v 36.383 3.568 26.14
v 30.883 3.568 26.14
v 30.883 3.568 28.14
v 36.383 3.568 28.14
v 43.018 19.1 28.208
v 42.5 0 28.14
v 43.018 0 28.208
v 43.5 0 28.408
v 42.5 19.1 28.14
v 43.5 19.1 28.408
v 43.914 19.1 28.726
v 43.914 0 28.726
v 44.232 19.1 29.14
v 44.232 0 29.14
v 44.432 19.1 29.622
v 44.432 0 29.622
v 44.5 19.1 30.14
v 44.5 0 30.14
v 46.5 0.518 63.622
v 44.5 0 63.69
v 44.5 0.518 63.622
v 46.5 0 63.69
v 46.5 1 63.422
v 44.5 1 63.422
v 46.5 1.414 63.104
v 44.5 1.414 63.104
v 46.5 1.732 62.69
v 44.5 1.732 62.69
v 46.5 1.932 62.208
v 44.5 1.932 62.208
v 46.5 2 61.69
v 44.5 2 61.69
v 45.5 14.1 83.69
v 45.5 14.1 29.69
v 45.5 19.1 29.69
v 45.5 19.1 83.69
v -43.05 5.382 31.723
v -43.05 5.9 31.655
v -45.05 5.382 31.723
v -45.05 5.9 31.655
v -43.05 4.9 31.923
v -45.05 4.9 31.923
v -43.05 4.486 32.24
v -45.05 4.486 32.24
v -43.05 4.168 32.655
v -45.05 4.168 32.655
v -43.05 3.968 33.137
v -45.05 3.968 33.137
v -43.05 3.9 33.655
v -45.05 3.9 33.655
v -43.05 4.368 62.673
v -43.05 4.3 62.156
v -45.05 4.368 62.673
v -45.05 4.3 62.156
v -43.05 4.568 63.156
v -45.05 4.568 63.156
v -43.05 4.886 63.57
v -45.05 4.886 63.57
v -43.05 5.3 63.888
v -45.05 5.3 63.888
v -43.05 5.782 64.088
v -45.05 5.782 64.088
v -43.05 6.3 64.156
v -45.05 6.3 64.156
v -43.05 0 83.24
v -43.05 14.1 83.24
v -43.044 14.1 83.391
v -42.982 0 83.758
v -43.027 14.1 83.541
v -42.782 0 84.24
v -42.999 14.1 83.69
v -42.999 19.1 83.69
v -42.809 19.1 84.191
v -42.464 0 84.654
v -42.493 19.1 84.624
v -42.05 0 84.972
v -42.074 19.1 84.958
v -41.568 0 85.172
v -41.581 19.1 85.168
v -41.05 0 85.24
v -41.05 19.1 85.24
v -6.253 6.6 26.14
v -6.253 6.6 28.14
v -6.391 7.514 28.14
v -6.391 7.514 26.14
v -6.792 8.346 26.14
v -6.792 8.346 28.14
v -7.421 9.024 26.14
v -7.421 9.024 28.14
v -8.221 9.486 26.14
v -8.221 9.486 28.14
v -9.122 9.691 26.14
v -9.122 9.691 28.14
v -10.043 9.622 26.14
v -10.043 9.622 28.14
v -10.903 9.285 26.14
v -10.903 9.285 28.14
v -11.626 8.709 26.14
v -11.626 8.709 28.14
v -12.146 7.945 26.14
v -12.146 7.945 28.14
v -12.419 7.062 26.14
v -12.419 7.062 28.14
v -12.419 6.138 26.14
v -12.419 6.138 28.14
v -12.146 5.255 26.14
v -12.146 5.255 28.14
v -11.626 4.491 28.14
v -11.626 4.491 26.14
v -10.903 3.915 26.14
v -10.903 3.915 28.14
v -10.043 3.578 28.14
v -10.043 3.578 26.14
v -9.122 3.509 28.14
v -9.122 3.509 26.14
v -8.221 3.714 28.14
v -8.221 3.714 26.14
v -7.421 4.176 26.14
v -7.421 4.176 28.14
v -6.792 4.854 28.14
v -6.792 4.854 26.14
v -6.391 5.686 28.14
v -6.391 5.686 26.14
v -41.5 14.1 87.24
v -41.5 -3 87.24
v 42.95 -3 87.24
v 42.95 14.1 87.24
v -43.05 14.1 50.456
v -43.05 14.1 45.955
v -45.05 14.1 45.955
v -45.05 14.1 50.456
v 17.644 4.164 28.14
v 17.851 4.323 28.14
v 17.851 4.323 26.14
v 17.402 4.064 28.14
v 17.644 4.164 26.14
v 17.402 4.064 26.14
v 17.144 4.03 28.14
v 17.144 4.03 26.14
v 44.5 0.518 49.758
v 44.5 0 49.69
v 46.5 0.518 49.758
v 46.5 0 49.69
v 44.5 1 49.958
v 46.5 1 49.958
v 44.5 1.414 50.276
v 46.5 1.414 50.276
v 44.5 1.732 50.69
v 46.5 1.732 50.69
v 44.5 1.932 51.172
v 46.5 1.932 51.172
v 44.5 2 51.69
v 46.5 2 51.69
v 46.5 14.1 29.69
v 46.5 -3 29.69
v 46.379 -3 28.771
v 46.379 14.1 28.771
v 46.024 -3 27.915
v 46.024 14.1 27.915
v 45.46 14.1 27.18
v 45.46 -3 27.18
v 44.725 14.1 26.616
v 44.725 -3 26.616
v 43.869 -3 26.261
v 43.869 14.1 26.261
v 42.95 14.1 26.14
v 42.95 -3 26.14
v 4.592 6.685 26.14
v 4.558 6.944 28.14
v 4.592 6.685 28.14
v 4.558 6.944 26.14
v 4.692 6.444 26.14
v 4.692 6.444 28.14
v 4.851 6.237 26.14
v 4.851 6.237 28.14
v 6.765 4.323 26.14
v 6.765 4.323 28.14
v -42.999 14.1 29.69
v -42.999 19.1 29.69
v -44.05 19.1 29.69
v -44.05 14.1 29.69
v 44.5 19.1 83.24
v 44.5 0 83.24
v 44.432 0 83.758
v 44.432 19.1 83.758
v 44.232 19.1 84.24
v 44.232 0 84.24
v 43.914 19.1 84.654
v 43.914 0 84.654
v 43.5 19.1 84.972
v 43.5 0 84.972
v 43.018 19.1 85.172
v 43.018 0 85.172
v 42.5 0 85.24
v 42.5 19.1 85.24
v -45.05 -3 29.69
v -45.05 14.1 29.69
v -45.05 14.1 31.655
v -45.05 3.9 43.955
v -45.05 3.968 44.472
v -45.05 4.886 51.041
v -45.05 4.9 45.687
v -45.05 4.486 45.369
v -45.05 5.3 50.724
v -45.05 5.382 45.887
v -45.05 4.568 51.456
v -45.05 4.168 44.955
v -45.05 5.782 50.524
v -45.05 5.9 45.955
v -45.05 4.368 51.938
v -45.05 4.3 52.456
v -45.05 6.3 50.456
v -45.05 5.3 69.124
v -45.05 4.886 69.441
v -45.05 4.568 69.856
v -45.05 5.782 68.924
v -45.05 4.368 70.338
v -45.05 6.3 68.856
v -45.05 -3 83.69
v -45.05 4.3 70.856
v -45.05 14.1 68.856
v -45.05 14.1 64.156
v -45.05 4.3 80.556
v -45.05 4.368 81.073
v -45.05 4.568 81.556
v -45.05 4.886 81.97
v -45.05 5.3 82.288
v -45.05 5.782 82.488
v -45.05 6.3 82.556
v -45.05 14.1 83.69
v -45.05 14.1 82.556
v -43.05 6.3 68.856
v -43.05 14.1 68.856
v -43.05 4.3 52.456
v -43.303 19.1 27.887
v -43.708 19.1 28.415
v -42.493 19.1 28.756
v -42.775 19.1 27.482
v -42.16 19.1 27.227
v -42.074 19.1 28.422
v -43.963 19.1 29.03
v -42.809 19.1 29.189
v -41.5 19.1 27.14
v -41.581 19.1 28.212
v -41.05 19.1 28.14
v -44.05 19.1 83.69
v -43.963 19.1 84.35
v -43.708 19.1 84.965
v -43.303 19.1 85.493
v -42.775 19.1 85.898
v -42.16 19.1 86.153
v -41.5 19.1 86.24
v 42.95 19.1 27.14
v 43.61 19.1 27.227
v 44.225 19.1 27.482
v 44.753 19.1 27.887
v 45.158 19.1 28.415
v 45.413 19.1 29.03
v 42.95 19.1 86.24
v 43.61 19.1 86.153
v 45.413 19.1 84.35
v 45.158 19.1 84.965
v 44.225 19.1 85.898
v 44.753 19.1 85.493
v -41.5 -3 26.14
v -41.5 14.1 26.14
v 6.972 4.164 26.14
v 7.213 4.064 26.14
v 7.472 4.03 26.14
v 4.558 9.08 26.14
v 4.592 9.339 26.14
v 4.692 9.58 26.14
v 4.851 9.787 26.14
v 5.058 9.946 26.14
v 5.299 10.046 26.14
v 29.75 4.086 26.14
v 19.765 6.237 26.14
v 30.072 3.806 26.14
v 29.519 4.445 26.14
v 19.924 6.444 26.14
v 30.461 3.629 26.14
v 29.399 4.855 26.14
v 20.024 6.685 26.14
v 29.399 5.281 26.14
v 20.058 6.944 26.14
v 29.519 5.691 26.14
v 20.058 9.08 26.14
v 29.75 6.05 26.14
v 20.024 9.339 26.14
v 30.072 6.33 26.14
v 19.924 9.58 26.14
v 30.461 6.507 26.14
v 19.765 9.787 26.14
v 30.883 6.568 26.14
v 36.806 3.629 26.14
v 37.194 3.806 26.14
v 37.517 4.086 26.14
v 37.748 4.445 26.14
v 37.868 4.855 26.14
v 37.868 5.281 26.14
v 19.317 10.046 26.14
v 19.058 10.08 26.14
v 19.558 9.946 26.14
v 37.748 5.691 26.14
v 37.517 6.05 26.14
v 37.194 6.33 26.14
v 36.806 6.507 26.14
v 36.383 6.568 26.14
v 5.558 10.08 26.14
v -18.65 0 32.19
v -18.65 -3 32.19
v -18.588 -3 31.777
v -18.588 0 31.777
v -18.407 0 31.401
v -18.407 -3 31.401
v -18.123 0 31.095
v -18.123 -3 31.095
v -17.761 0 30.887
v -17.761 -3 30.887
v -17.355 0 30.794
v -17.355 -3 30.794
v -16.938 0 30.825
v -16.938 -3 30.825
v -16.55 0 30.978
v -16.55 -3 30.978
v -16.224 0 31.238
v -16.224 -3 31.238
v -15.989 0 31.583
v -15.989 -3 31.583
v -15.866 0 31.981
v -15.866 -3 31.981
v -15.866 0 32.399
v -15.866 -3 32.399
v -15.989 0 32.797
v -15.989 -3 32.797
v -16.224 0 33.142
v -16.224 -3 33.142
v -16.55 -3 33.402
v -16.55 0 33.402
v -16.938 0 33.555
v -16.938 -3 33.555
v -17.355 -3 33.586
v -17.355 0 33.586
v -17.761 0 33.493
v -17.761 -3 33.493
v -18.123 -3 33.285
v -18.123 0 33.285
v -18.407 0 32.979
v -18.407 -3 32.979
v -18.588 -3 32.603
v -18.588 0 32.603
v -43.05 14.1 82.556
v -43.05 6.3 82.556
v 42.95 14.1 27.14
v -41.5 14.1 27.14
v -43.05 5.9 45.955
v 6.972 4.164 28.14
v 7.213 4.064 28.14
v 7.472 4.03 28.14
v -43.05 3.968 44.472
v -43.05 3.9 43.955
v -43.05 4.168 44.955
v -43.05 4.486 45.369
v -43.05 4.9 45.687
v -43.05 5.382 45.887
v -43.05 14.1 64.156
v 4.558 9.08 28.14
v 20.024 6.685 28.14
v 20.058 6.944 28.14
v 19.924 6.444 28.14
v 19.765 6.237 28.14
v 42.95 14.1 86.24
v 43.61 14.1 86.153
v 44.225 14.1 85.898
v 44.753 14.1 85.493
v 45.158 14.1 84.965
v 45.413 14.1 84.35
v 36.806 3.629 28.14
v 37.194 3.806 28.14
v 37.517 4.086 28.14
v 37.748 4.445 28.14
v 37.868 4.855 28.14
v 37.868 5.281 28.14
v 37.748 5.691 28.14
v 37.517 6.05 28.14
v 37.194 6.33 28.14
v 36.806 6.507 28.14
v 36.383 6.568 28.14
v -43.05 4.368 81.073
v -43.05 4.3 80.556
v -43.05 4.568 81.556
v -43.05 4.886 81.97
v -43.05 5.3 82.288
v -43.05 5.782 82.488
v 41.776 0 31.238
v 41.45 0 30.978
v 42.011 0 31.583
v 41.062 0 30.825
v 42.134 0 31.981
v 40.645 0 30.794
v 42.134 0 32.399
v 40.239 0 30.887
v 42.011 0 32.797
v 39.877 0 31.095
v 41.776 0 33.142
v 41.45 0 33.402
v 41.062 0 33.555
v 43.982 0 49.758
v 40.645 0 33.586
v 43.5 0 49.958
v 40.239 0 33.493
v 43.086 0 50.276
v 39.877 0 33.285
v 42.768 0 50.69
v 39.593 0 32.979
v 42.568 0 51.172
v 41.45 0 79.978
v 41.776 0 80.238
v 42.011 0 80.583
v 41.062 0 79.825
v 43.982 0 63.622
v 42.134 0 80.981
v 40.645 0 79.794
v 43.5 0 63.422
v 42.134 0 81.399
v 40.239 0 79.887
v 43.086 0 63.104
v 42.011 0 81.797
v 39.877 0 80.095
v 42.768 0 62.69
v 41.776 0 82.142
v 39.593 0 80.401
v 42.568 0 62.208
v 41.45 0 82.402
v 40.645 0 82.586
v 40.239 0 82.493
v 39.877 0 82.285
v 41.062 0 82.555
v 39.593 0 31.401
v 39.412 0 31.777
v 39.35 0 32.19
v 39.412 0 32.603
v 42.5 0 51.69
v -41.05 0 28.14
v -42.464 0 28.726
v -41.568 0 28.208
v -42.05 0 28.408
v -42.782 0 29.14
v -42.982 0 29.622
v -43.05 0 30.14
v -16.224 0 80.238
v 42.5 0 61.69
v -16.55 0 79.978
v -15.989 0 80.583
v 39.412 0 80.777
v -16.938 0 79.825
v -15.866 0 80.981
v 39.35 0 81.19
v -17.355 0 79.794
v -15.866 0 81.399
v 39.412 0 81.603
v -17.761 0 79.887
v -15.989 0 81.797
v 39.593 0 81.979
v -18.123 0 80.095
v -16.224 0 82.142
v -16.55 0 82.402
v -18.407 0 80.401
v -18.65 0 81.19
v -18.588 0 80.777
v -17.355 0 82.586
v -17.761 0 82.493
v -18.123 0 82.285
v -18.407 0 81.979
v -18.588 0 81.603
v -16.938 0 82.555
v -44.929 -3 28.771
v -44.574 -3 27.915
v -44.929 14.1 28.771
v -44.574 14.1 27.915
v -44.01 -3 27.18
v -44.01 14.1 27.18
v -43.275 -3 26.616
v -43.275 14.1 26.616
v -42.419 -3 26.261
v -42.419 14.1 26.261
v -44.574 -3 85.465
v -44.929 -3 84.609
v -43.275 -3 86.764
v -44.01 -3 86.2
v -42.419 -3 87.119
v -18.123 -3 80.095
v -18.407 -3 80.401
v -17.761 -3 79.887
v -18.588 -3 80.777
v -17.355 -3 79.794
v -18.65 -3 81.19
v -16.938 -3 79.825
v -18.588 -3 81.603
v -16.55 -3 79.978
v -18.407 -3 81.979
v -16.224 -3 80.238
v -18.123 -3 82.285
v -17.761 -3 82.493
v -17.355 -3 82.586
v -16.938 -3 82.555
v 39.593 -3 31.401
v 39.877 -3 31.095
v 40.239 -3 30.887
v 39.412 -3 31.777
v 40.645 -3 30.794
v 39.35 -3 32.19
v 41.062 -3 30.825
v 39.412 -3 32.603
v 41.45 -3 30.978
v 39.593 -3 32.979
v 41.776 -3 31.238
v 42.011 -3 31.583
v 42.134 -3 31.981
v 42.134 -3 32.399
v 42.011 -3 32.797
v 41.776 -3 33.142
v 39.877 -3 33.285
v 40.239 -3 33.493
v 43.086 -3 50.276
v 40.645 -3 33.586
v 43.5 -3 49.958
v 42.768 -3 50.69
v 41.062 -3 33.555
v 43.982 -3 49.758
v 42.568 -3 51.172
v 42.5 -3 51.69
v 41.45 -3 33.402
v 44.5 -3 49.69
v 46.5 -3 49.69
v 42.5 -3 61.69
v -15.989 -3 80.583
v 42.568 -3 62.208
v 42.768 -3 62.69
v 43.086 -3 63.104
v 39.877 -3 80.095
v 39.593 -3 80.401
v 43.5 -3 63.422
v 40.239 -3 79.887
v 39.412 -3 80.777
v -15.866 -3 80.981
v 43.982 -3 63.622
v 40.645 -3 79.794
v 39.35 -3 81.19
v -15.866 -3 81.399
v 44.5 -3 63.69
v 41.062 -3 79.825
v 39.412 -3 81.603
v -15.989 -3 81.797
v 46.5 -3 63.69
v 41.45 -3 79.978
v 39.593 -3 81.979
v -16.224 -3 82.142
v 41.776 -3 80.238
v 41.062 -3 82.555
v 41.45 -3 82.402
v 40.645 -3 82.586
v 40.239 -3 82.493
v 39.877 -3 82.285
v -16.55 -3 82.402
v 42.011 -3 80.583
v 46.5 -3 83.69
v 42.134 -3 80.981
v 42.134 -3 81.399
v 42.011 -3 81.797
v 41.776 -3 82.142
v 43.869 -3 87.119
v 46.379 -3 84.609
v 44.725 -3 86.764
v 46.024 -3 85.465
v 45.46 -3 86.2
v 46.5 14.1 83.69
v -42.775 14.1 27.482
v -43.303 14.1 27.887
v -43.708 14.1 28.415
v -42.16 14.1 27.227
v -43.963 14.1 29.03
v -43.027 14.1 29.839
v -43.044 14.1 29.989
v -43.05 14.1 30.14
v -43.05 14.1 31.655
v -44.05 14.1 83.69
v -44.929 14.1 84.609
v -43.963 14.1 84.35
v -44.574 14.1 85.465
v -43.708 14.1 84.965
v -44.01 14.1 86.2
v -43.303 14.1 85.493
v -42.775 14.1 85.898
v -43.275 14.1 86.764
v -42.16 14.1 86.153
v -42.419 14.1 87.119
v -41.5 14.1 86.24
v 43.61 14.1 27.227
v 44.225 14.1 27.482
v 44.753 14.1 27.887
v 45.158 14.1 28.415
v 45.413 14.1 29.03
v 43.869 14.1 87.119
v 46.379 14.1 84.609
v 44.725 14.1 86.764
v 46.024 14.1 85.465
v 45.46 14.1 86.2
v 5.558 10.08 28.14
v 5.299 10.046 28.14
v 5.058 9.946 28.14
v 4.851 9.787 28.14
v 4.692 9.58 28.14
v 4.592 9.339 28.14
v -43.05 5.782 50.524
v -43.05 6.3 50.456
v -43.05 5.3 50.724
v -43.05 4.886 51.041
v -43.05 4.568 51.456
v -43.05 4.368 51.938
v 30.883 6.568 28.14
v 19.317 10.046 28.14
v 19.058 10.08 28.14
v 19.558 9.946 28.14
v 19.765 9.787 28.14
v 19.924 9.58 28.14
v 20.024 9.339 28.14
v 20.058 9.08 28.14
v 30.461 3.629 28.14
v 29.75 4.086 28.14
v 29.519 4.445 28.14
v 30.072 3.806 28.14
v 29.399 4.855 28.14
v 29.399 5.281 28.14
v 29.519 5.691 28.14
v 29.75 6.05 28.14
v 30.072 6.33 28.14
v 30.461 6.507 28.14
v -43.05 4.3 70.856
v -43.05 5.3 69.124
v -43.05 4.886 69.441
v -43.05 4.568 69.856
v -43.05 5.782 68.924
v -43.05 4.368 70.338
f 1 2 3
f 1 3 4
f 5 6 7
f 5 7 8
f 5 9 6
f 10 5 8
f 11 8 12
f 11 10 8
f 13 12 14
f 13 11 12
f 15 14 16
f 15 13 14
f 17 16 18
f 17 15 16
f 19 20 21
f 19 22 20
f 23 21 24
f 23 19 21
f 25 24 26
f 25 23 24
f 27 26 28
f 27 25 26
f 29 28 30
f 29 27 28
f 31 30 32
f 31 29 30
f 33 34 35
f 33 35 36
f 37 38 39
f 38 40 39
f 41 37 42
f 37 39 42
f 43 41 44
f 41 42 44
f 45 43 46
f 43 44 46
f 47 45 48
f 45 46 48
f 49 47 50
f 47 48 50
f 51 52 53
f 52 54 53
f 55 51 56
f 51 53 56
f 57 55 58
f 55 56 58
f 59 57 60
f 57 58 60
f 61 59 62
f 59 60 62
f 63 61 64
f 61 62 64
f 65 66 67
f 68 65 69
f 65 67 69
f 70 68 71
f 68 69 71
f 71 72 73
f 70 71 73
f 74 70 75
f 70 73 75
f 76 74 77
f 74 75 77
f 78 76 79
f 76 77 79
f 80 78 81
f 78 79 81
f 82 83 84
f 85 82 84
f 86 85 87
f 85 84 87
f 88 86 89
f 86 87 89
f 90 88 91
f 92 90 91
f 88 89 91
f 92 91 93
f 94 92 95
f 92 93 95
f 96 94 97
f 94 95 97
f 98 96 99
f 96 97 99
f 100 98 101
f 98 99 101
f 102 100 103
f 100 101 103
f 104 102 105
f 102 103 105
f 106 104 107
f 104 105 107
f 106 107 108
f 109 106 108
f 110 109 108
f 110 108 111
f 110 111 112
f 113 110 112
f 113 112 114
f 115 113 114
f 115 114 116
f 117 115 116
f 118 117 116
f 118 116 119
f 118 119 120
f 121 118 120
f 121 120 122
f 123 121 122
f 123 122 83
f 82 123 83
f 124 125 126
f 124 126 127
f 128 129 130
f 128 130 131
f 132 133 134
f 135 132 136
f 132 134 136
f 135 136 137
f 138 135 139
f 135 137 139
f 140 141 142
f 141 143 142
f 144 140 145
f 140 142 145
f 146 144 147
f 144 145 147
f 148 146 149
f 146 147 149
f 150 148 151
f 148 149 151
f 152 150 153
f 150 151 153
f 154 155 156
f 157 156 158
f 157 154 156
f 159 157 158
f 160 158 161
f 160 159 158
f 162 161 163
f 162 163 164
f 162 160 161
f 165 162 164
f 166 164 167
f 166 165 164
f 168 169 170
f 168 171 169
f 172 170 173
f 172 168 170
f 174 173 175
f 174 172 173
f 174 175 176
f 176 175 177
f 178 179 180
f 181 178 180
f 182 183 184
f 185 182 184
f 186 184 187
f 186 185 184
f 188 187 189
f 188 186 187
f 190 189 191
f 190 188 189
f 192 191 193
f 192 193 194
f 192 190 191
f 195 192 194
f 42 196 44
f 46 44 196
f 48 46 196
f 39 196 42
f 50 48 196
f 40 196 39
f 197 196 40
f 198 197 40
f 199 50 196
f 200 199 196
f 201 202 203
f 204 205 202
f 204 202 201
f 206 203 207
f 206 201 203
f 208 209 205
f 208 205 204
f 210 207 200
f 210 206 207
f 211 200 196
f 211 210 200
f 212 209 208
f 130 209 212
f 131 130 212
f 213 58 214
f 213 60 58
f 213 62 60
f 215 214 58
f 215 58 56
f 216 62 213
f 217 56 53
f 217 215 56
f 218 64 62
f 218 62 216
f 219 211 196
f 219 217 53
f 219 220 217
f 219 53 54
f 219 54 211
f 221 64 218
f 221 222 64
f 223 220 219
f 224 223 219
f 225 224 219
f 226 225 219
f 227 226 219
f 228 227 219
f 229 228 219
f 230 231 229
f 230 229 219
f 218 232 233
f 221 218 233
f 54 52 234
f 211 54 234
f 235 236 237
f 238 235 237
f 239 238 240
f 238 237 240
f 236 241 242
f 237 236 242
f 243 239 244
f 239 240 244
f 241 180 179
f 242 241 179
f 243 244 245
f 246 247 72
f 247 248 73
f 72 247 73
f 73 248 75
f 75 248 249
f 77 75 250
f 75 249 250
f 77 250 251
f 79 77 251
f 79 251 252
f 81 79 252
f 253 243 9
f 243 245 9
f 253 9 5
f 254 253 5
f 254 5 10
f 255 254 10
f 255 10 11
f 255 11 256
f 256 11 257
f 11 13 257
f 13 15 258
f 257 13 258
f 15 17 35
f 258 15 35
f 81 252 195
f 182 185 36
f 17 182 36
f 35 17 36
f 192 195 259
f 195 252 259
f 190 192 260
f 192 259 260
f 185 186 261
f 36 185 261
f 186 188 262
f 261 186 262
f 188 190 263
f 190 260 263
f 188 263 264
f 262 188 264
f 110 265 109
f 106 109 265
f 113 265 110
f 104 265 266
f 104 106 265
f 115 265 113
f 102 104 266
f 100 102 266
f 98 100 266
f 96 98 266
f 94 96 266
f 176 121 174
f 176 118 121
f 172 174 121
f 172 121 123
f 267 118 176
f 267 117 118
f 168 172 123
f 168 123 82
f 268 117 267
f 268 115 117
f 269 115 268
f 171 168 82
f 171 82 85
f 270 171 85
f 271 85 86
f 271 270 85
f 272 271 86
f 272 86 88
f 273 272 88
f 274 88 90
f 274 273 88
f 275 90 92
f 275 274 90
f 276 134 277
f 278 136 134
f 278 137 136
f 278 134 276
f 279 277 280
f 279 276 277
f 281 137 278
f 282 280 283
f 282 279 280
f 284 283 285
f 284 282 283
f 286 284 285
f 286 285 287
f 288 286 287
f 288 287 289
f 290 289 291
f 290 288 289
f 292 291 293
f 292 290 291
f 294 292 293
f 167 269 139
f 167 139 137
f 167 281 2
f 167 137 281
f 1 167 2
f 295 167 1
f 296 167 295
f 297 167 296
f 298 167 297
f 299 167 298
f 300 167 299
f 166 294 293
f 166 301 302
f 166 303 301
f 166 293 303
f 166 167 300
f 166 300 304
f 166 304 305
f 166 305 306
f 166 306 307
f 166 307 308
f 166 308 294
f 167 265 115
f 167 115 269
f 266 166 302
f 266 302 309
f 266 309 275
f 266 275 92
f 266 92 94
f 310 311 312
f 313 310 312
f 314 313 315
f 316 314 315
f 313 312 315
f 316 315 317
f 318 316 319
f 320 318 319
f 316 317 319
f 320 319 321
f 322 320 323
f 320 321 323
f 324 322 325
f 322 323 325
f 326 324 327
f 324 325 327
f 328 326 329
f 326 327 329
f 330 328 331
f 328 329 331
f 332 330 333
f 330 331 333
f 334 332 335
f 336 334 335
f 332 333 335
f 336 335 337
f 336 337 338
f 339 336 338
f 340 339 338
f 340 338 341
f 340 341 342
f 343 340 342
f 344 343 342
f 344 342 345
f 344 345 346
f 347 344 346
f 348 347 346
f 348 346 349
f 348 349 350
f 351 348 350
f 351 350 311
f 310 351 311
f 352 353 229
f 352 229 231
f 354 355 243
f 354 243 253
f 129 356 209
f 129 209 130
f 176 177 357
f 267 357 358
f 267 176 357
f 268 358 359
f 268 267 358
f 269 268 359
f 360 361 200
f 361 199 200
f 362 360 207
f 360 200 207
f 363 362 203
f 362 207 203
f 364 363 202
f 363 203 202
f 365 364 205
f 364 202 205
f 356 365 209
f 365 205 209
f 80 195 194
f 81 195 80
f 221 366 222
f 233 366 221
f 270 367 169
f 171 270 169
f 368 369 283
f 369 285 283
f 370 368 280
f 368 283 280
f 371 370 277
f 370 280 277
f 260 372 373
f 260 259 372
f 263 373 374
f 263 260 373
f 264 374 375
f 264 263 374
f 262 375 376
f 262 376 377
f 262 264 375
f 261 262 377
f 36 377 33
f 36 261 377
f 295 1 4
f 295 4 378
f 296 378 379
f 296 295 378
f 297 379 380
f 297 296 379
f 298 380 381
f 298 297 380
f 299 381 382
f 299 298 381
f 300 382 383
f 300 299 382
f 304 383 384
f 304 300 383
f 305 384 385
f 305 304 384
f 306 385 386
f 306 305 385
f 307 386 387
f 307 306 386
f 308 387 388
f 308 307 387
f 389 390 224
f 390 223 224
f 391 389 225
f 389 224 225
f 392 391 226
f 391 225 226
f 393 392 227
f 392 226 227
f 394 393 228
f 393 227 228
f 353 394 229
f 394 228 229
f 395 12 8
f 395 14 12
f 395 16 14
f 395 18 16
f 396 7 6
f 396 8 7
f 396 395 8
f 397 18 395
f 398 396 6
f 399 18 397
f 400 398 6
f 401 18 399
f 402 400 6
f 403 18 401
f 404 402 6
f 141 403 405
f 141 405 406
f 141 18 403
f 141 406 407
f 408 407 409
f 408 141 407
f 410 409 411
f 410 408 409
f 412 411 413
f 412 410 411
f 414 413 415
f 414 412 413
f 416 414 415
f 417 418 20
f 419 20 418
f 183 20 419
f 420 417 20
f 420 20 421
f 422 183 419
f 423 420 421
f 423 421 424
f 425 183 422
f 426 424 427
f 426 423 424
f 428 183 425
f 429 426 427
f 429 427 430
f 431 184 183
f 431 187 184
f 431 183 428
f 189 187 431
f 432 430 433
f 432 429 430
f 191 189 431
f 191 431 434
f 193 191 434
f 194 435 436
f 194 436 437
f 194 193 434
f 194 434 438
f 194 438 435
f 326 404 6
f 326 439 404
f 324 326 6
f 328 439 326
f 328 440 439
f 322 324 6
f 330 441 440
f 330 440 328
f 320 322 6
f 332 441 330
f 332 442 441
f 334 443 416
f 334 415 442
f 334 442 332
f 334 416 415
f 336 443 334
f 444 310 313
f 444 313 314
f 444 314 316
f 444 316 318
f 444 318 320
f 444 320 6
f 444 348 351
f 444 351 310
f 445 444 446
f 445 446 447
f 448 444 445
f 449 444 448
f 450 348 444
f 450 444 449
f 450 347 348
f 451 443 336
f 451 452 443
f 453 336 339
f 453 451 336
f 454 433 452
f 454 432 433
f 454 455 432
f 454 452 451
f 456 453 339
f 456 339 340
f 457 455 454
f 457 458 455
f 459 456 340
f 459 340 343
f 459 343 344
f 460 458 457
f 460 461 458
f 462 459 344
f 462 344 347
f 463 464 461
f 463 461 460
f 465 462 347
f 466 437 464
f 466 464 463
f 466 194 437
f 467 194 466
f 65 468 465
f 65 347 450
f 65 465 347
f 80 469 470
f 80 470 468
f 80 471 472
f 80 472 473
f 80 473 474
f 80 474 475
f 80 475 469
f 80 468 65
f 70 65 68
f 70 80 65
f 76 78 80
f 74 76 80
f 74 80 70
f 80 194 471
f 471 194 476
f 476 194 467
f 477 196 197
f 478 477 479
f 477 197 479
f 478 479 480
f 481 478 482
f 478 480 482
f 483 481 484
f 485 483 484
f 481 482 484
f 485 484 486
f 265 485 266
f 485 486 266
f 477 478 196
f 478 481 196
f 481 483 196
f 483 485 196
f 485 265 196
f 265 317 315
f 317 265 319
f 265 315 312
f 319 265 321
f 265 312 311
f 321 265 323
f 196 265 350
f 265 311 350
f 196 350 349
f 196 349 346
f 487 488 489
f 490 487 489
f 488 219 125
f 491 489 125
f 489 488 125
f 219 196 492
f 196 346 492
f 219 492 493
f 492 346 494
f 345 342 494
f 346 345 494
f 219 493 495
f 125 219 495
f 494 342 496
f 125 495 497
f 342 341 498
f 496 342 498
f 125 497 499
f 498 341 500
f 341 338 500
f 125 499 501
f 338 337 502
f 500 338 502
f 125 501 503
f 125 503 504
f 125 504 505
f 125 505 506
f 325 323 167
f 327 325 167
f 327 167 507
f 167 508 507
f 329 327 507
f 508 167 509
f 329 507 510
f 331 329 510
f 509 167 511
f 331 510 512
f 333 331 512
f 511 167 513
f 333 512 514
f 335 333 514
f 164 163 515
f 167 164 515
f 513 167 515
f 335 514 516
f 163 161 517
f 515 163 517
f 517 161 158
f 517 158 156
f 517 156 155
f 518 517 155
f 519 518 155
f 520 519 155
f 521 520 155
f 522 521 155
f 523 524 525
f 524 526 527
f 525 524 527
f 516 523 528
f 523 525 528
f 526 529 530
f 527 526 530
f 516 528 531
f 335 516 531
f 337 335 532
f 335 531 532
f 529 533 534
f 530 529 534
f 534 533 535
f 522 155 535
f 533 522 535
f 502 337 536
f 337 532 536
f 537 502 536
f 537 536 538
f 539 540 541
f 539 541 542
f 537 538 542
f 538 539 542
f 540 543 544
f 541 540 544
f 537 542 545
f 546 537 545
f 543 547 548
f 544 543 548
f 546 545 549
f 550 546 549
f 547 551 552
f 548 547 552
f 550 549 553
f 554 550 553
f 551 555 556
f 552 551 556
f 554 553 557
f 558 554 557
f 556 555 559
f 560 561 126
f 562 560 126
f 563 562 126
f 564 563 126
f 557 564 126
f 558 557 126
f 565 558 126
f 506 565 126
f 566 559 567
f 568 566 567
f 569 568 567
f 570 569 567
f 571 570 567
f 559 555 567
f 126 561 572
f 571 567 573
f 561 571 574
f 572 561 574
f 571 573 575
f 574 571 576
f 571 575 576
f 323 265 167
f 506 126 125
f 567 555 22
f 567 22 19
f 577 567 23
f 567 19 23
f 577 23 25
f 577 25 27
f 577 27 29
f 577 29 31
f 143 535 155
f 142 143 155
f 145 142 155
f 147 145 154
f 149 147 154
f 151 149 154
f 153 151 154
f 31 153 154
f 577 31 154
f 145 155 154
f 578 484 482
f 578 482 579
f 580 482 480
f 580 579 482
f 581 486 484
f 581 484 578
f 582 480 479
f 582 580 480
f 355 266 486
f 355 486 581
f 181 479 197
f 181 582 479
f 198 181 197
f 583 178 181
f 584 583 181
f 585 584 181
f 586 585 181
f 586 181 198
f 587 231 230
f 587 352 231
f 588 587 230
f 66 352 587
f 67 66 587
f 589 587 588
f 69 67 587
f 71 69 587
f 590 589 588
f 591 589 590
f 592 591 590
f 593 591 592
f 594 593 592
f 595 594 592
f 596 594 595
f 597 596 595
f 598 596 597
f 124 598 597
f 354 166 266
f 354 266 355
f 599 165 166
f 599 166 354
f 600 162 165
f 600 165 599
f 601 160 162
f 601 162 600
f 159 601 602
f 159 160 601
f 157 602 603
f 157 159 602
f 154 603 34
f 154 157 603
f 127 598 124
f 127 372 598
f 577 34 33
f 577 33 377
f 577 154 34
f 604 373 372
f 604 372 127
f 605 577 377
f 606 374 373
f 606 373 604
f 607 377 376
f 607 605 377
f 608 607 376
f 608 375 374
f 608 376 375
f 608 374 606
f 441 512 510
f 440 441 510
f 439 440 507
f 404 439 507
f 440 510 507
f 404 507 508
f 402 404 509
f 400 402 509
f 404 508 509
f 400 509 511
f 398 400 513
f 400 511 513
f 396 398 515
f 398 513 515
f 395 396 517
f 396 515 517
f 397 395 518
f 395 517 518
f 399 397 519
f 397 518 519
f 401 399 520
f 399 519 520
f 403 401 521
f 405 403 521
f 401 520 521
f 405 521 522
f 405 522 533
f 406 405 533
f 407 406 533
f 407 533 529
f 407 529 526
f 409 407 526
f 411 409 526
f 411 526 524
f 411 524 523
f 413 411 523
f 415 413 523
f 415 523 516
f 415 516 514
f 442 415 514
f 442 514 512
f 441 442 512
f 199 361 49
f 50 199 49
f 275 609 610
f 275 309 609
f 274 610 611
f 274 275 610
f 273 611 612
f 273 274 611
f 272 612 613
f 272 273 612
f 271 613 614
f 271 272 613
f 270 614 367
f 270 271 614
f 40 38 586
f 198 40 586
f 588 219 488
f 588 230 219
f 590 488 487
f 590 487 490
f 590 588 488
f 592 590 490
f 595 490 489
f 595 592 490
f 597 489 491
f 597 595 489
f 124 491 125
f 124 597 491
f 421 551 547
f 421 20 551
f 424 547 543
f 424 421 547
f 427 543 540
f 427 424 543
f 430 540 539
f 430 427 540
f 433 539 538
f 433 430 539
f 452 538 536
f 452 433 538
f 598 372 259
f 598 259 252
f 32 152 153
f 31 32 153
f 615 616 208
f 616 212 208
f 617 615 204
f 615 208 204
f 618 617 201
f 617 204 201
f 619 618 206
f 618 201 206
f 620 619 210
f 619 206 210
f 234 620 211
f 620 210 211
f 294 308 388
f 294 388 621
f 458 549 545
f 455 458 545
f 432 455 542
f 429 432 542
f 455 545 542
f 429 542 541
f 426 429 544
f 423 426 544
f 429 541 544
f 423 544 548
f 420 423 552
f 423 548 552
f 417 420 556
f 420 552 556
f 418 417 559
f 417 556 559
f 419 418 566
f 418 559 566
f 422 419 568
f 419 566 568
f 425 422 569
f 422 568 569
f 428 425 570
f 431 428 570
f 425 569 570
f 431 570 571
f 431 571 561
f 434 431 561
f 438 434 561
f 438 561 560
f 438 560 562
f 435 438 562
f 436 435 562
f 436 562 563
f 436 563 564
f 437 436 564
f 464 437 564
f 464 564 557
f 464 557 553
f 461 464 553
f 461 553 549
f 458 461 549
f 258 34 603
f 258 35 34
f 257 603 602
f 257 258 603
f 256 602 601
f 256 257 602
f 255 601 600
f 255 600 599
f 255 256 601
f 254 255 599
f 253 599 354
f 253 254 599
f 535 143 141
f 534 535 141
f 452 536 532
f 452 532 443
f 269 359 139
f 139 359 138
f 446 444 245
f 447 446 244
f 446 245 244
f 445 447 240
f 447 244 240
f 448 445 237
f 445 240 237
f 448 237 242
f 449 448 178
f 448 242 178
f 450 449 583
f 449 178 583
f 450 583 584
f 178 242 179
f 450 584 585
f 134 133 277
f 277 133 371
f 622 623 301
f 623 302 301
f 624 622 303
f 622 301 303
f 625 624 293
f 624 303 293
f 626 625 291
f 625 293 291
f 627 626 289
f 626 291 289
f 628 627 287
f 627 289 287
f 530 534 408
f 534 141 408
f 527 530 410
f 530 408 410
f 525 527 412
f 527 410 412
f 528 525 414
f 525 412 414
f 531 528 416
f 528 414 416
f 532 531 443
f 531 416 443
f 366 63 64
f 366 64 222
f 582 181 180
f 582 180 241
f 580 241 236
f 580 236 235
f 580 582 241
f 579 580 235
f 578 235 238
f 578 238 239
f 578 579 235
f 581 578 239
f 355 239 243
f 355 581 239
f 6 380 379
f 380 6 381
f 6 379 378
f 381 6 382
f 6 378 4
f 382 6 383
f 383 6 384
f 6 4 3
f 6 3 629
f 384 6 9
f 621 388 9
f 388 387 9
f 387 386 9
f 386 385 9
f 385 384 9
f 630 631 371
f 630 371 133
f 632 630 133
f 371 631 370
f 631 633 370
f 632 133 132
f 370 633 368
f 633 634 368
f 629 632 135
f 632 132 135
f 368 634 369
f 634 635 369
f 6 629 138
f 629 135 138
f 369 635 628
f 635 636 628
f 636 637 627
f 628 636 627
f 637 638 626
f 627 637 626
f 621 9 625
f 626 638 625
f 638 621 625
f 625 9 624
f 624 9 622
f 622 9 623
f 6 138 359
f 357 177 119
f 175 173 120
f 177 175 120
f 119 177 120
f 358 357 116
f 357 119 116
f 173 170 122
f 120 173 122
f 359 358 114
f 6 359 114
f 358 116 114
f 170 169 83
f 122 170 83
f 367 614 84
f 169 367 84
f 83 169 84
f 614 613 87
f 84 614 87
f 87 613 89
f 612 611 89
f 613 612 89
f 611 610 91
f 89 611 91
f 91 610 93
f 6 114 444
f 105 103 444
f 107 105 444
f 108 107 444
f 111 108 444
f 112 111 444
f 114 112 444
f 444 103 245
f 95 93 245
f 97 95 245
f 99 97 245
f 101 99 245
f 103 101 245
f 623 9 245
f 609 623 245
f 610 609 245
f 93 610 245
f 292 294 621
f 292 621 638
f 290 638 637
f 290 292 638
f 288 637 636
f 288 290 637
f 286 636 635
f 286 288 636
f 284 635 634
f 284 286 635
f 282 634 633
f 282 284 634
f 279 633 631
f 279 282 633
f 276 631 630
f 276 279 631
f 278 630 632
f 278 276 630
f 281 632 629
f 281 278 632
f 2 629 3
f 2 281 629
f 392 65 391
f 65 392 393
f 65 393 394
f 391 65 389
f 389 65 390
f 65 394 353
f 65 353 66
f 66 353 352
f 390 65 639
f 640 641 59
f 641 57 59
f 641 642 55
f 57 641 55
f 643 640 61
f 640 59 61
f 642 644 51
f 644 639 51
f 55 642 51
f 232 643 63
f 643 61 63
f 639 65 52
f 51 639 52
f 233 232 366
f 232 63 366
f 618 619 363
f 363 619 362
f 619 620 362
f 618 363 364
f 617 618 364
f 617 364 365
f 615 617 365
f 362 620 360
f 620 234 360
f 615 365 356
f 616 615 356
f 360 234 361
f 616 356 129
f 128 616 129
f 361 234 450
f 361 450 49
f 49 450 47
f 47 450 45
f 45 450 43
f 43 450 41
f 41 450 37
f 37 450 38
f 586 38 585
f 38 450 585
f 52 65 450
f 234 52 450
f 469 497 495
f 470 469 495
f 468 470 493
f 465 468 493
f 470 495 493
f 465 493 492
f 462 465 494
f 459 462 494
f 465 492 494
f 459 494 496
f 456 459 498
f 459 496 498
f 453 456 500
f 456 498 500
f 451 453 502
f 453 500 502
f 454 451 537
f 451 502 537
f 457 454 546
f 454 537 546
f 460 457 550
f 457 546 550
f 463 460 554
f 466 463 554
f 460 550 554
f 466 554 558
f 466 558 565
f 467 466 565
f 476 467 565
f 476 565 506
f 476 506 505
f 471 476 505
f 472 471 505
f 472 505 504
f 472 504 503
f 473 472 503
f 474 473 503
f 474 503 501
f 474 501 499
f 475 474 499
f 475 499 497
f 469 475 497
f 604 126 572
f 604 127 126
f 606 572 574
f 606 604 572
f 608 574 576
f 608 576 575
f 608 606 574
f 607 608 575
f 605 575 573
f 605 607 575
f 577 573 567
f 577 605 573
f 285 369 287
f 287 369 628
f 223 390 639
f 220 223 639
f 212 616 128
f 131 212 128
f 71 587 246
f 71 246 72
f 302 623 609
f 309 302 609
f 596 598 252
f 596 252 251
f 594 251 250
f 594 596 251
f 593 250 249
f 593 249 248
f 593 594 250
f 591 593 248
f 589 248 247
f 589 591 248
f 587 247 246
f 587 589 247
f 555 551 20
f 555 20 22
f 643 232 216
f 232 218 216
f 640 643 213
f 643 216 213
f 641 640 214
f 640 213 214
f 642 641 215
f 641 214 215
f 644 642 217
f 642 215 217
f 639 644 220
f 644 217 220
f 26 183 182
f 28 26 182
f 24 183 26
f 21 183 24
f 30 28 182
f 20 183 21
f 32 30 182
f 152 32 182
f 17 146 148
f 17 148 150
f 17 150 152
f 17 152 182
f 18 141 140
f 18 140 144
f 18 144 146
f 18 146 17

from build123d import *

# Parameters (mm, degrees)
SKETCH1_W                      = 86.55
SKETCH1_H                      = 17.1
BOSS_EXTRUDE1_DEPTH            = 14
SKETCH2_W                      = 88.55
SKETCH2_H                      = 17.1
BOSS_EXTRUDE2_DEPTH            = 23.55
SKETCH3_W                      = 37.55
SKETCH3_H                      = 17.1
BOSS_EXTRUDE3_DEPTH            = 2
SKETCH4_W                      = 90.55
SKETCH4_H                      = 17.1
BOSS_EXTRUDE4_DEPTH            = 23.55
SKETCH5_W                      = 2
SKETCH5_H                      = 14
CUT_EXTRUDE1_DEPTH             = 3
CUT_EXTRUDE2_DEPTH             = 14.1
SKETCH7_W                      = 2
SKETCH7_H                      = 14
CUT_EXTRUDE3_DEPTH             = 2
BOSS_EXTRUDE5_DEPTH            = 5
SKETCH9_W                      = 87.55
SKETCH9_H                      = 19.1
CUT_EXTRUDE4_DEPTH             = 1.55
SKETCH10_W                     = 61.1
SKETCH10_H                     = 17.1
BOSS_EXTRUDE6_DEPTH            = 1
CUT_EXTRUDE5_REACH             = 79.588
SKETCH11_W                     = 87.55
SKETCH11_H                     = 19.1
SKETCH12_W                     = 13.7
SKETCH12_H                     = 9.8
CUT_EXTRUDE6_DEPTH             = 127.470668932
SKETCH13_W                     = 13.7
SKETCH13_H                     = 9.8
CUT_EXTRUDE7_DEPTH             = 127.470668932
SKETCH14_W                     = 14.3
SKETCH14_H                     = 10.2
CUT_EXTRUDE8_DEPTH             = 127.470668932
CUT_EXTRUDE10_DEPTH            = 78.587821209
CUT_EXTRUDE11_REACH            = 81.122
F_2_8_2_8_DIAMETER_HOLE1_D     = 2.8
F_6_2_6_2_DIAMETER_HOLE1_D     = 6.2
F_6_2_6_2_DIAMETER_HOLE1_DEPTH = 2
FILLET1_R                      = 1
FILLET2_R                      = 2
FILLET3_R                      = 2.55
FILLET4_R                      = 3.55


with BuildPart() as part:
    # Sketch1 → Boss-Extrude1 (new body)
    with BuildSketch(Plane.XY.offset(63.69)):
        with Locations((-0.775, 5.55)):
            Rectangle(SKETCH1_W, SKETCH1_H)
    extrude(amount=-BOSS_EXTRUDE1_DEPTH)

    # Sketch2 → Boss-Extrude2 (add)
    with BuildSketch(Plane(origin=(0, 0, 49.69), x_dir=(-1, 0, 0), z_dir=(0, 0, -1))):
        with Locations((-0.225, 5.55)):
            Rectangle(SKETCH2_W, SKETCH2_H)
    extrude(amount=BOSS_EXTRUDE2_DEPTH)

    # Sketch3 → Boss-Extrude3 (add)
    with BuildSketch(Plane(origin=(44.5, 0, 0), x_dir=(0, 0, -1), z_dir=(1, 0, 0))):
        with Locations((-44.915, 5.55)):
            Rectangle(SKETCH3_W, SKETCH3_H)
    extrude(amount=BOSS_EXTRUDE3_DEPTH)

    # Sketch4 → Boss-Extrude4 (add)
    with BuildSketch(Plane.XY.offset(63.69)):
        with Locations((1.225, 5.55)):
            Rectangle(SKETCH4_W, SKETCH4_H)
    extrude(amount=BOSS_EXTRUDE4_DEPTH)

    # Sketch5 → Cut-Extrude1 (cut)
    with BuildSketch(Plane.XZ.offset(3)):
        with Locations((45.5, 56.69)):
            Rectangle(SKETCH5_W, SKETCH5_H)
    extrude(amount=-CUT_EXTRUDE1_DEPTH, mode=Mode.SUBTRACT)

    # Sketch6 → Cut-Extrude2 (cut)
    with BuildSketch(Plane(origin=(0, 14.1, 0), x_dir=(-1, 0, 0), z_dir=(0, 1, 0))):
        Polygon((43.05, 29.69), (43.05, 83.69), (-44.5, 83.69), (-44.5, 63.69), (-42.5, 63.69), (-42.5, 49.69), (-44.5, 49.69), (-44.5, 29.69), align=None)
    extrude(amount=-CUT_EXTRUDE2_DEPTH, mode=Mode.SUBTRACT)

    # Sketch7 → Cut-Extrude3 (cut)
    with BuildSketch(Plane.XZ):
        with Locations((45.5, 56.69)):
            Rectangle(SKETCH7_W, SKETCH7_H)
    extrude(amount=-CUT_EXTRUDE3_DEPTH, mode=Mode.SUBTRACT)

    # Sketch8 → Boss-Extrude5 (add)
    with BuildSketch(Plane(origin=(0, 14.1, 0), x_dir=(-1, 0, 0), z_dir=(0, 1, 0))):
        with BuildLine():
            Line((-44.5, 83.69), (-44.5, 29.69))
            Line((-44.5, 29.69), (44.05, 29.69))
            ThreePointArc((44.05, 29.69), (43.303122292, 27.886877708), (41.5, 27.14))
            Line((41.5, 27.14), (-45.5, 27.14))
            Line((-45.5, 27.14), (-45.5, 86.24))
            Line((-45.5, 86.24), (41.5, 86.24))
            ThreePointArc((41.5, 86.24), (43.303122292, 85.493122292), (44.05, 83.69))
            Line((44.05, 83.69), (-44.5, 83.69))
        make_face()
    extrude(amount=BOSS_EXTRUDE5_DEPTH)

    # Sketch9 → Cut-Extrude4 (cut)
    with BuildSketch(Plane(origin=(0, 0, 83.69), x_dir=(-1, 0, 0), z_dir=(0, 0, -1))):
        with Locations((-0.725, 9.55)):
            Rectangle(SKETCH9_W, SKETCH9_H)
    extrude(amount=-CUT_EXTRUDE4_DEPTH, mode=Mode.SUBTRACT)

    # Sketch10 → Boss-Extrude6 (add)
    with BuildSketch(Plane.ZY.offset(44.05)):
        with Locations((56.69, 5.55)):
            Rectangle(SKETCH10_W, SKETCH10_H)
    extrude(amount=BOSS_EXTRUDE6_DEPTH)

    # Sketch11 → Cut-Extrude5 (cut, up to next)
    with BuildSketch(Plane(origin=(0, 0, 28.14), x_dir=(-1, 0, 0), z_dir=(0, 0, -1)), mode=Mode.PRIVATE) as cut_extrude5_sk1:
        with Locations((-0.725, 9.55)):
            Rectangle(SKETCH11_W, SKETCH11_H)
    cut_extrude5_tool1 = extrude(cut_extrude5_sk1.sketch, amount=-CUT_EXTRUDE5_REACH, mode=Mode.PRIVATE) & part.part
    add(cut_extrude5_tool1.solids().sort_by_distance((0.725, 9.55, 28.14))[0], mode=Mode.SUBTRACT)

    # Sketch12 → Cut-Extrude6 (cut, through all)
    with BuildSketch(Plane(origin=(-43.05, 0, 0), x_dir=(0, 0, -1), z_dir=(1, 0, 0))):
        with Locations((-75.705690784, 9.2)):
            Rectangle(SKETCH12_W, SKETCH12_H)
    extrude(amount=-CUT_EXTRUDE6_DEPTH, mode=Mode.SUBTRACT)

    # Sketch13 → Cut-Extrude7 (cut, through all)
    with BuildSketch(Plane(origin=(-43.05, 0, 0), x_dir=(0, 0, -1), z_dir=(1, 0, 0))):
        with Locations((-57.305690784, 9.2)):
            Rectangle(SKETCH13_W, SKETCH13_H)
    extrude(amount=-CUT_EXTRUDE7_DEPTH, mode=Mode.SUBTRACT)

    # Sketch14 → Cut-Extrude8 (cut, through all)
    with BuildSketch(Plane(origin=(-43.05, 0, 0), x_dir=(0, 0, -1), z_dir=(1, 0, 0))):
        with Locations((-38.80469145, 9)):
            Rectangle(SKETCH14_W, SKETCH14_H)
    extrude(amount=-CUT_EXTRUDE8_DEPTH, mode=Mode.SUBTRACT)

    # Sketch16 → Cut-Extrude10 (cut, through all)
    with BuildSketch(Plane.XY.offset(28.14)):
        Polygon((20.057791158, 10.08), (4.557791136, 10.08), (4.557791136, 6.52999997), (7.057791136, 4.02999997), (17.557791158, 4.02999997), (20.057791158, 6.52999997), align=None)
    extrude(amount=-CUT_EXTRUDE10_DEPTH, mode=Mode.SUBTRACT)

    # Sketch17 → Cut-Extrude11 (cut, up to next)
    with BuildSketch(Plane(origin=(0, 0, 26.14), x_dir=(-1, 0, 0), z_dir=(0, 0, -1)), mode=Mode.PRIVATE) as cut_extrude11_sk1:
        with BuildLine():
            Line((-36.3834392, 6.568002867), (-30.8834392, 6.568002867))
            ThreePointArc((-30.8834392, 6.568002867), (-29.3834392, 5.068002867), (-30.8834392, 3.568002867))
            Line((-30.8834392, 3.568002867), (-36.3834392, 3.568002867))
            ThreePointArc((-36.3834392, 3.568002867), (-37.8834392, 5.068002867), (-36.3834392, 6.568002867))
        make_face()
    cut_extrude11_tool1 = extrude(cut_extrude11_sk1.sketch, amount=-CUT_EXTRUDE11_REACH, mode=Mode.PRIVATE) & part.part
    add(cut_extrude11_tool1.solids().sort_by_distance((33.633439, 5.068003, 26.14))[0], mode=Mode.SUBTRACT)

    # Ø2.8 (2.8) Diameter Hole1 (through all)
    with Locations(Plane(origin=(0, 0, 0), x_dir=(1, 0, 0), z_dir=(0, 1, 0))):
        with Locations((40.75, -81.19), (40.75, -32.19), (-17.25, -32.19), (-17.25, -81.19)):
            Hole(F_2_8_2_8_DIAMETER_HOLE1_D / 2)

    # Ø6.2 (6.2) Diameter Hole1
    with Locations(Plane(origin=(0, 0, 26.14), x_dir=(-1, 0, 0), z_dir=(0, 0, -1))):
        with Locations((9.353475334, 6.6)):
            Hole(F_6_2_6_2_DIAMETER_HOLE1_D / 2, depth=F_6_2_6_2_DIAMETER_HOLE1_DEPTH)

    # Fillet1
    fillet1_edges = [part.edges().sort_by_distance(p)[0] for p in [
        (20.057791158, 10.08, 27.14),
        (20.057791158, 6.52999997, 27.14),
        (17.557791158, 4.02999997, 27.14),
        (7.057791136, 4.02999997, 27.14),
        (4.557791136, 6.52999997, 27.14),
        (4.557791136, 10.08, 27.14),
    ]]
    fillet(fillet1_edges, radius=FILLET1_R)

    # Fillet2
    fillet2_edges = [part.edges().sort_by_distance(p)[0] for p in [
        (42.5, -1.5, 49.69),
        (42.5, -1.5, 63.69),
        (-44.05, 4.3, 82.555690784),
        (45.5, 2, 63.69),
        (-44.05, 4.3, 64.155690784),
        (-43.05, 9.55, 85.24),
        (44.5, 9.55, 85.24),
        (-44.05, 4.3, 50.455690784),
        (45.5, 2, 49.69),
        (-44.05, 3.9, 45.95469145),
        (-44.05, 4.3, 68.855690784),
        (-44.05, 3.9, 31.65469145),
        (44.5, 9.55, 28.14),
        (-43.05, 9.55, 28.14),
    ]]
    fillet(fillet2_edges, radius=FILLET2_R)

    # Fillet3
    fillet3_edges = [part.edges().sort_by_distance(p)[0] for p in [
        (45.5, 16.6, 86.24),
        (45.5, 16.6, 27.14),
    ]]
    fillet(fillet3_edges, radius=FILLET3_R)

    # Fillet4
    fillet4_edges = [part.edges().sort_by_distance(p)[0] for p in [
        (-45.05, 5.55, 26.14),
        (-45.05, 5.55, 87.24),
        (46.5, 5.55, 26.14),
        (46.5, 5.55, 87.24),
    ]]
    fillet(fillet4_edges, radius=FILLET4_R)


solid = part.part
